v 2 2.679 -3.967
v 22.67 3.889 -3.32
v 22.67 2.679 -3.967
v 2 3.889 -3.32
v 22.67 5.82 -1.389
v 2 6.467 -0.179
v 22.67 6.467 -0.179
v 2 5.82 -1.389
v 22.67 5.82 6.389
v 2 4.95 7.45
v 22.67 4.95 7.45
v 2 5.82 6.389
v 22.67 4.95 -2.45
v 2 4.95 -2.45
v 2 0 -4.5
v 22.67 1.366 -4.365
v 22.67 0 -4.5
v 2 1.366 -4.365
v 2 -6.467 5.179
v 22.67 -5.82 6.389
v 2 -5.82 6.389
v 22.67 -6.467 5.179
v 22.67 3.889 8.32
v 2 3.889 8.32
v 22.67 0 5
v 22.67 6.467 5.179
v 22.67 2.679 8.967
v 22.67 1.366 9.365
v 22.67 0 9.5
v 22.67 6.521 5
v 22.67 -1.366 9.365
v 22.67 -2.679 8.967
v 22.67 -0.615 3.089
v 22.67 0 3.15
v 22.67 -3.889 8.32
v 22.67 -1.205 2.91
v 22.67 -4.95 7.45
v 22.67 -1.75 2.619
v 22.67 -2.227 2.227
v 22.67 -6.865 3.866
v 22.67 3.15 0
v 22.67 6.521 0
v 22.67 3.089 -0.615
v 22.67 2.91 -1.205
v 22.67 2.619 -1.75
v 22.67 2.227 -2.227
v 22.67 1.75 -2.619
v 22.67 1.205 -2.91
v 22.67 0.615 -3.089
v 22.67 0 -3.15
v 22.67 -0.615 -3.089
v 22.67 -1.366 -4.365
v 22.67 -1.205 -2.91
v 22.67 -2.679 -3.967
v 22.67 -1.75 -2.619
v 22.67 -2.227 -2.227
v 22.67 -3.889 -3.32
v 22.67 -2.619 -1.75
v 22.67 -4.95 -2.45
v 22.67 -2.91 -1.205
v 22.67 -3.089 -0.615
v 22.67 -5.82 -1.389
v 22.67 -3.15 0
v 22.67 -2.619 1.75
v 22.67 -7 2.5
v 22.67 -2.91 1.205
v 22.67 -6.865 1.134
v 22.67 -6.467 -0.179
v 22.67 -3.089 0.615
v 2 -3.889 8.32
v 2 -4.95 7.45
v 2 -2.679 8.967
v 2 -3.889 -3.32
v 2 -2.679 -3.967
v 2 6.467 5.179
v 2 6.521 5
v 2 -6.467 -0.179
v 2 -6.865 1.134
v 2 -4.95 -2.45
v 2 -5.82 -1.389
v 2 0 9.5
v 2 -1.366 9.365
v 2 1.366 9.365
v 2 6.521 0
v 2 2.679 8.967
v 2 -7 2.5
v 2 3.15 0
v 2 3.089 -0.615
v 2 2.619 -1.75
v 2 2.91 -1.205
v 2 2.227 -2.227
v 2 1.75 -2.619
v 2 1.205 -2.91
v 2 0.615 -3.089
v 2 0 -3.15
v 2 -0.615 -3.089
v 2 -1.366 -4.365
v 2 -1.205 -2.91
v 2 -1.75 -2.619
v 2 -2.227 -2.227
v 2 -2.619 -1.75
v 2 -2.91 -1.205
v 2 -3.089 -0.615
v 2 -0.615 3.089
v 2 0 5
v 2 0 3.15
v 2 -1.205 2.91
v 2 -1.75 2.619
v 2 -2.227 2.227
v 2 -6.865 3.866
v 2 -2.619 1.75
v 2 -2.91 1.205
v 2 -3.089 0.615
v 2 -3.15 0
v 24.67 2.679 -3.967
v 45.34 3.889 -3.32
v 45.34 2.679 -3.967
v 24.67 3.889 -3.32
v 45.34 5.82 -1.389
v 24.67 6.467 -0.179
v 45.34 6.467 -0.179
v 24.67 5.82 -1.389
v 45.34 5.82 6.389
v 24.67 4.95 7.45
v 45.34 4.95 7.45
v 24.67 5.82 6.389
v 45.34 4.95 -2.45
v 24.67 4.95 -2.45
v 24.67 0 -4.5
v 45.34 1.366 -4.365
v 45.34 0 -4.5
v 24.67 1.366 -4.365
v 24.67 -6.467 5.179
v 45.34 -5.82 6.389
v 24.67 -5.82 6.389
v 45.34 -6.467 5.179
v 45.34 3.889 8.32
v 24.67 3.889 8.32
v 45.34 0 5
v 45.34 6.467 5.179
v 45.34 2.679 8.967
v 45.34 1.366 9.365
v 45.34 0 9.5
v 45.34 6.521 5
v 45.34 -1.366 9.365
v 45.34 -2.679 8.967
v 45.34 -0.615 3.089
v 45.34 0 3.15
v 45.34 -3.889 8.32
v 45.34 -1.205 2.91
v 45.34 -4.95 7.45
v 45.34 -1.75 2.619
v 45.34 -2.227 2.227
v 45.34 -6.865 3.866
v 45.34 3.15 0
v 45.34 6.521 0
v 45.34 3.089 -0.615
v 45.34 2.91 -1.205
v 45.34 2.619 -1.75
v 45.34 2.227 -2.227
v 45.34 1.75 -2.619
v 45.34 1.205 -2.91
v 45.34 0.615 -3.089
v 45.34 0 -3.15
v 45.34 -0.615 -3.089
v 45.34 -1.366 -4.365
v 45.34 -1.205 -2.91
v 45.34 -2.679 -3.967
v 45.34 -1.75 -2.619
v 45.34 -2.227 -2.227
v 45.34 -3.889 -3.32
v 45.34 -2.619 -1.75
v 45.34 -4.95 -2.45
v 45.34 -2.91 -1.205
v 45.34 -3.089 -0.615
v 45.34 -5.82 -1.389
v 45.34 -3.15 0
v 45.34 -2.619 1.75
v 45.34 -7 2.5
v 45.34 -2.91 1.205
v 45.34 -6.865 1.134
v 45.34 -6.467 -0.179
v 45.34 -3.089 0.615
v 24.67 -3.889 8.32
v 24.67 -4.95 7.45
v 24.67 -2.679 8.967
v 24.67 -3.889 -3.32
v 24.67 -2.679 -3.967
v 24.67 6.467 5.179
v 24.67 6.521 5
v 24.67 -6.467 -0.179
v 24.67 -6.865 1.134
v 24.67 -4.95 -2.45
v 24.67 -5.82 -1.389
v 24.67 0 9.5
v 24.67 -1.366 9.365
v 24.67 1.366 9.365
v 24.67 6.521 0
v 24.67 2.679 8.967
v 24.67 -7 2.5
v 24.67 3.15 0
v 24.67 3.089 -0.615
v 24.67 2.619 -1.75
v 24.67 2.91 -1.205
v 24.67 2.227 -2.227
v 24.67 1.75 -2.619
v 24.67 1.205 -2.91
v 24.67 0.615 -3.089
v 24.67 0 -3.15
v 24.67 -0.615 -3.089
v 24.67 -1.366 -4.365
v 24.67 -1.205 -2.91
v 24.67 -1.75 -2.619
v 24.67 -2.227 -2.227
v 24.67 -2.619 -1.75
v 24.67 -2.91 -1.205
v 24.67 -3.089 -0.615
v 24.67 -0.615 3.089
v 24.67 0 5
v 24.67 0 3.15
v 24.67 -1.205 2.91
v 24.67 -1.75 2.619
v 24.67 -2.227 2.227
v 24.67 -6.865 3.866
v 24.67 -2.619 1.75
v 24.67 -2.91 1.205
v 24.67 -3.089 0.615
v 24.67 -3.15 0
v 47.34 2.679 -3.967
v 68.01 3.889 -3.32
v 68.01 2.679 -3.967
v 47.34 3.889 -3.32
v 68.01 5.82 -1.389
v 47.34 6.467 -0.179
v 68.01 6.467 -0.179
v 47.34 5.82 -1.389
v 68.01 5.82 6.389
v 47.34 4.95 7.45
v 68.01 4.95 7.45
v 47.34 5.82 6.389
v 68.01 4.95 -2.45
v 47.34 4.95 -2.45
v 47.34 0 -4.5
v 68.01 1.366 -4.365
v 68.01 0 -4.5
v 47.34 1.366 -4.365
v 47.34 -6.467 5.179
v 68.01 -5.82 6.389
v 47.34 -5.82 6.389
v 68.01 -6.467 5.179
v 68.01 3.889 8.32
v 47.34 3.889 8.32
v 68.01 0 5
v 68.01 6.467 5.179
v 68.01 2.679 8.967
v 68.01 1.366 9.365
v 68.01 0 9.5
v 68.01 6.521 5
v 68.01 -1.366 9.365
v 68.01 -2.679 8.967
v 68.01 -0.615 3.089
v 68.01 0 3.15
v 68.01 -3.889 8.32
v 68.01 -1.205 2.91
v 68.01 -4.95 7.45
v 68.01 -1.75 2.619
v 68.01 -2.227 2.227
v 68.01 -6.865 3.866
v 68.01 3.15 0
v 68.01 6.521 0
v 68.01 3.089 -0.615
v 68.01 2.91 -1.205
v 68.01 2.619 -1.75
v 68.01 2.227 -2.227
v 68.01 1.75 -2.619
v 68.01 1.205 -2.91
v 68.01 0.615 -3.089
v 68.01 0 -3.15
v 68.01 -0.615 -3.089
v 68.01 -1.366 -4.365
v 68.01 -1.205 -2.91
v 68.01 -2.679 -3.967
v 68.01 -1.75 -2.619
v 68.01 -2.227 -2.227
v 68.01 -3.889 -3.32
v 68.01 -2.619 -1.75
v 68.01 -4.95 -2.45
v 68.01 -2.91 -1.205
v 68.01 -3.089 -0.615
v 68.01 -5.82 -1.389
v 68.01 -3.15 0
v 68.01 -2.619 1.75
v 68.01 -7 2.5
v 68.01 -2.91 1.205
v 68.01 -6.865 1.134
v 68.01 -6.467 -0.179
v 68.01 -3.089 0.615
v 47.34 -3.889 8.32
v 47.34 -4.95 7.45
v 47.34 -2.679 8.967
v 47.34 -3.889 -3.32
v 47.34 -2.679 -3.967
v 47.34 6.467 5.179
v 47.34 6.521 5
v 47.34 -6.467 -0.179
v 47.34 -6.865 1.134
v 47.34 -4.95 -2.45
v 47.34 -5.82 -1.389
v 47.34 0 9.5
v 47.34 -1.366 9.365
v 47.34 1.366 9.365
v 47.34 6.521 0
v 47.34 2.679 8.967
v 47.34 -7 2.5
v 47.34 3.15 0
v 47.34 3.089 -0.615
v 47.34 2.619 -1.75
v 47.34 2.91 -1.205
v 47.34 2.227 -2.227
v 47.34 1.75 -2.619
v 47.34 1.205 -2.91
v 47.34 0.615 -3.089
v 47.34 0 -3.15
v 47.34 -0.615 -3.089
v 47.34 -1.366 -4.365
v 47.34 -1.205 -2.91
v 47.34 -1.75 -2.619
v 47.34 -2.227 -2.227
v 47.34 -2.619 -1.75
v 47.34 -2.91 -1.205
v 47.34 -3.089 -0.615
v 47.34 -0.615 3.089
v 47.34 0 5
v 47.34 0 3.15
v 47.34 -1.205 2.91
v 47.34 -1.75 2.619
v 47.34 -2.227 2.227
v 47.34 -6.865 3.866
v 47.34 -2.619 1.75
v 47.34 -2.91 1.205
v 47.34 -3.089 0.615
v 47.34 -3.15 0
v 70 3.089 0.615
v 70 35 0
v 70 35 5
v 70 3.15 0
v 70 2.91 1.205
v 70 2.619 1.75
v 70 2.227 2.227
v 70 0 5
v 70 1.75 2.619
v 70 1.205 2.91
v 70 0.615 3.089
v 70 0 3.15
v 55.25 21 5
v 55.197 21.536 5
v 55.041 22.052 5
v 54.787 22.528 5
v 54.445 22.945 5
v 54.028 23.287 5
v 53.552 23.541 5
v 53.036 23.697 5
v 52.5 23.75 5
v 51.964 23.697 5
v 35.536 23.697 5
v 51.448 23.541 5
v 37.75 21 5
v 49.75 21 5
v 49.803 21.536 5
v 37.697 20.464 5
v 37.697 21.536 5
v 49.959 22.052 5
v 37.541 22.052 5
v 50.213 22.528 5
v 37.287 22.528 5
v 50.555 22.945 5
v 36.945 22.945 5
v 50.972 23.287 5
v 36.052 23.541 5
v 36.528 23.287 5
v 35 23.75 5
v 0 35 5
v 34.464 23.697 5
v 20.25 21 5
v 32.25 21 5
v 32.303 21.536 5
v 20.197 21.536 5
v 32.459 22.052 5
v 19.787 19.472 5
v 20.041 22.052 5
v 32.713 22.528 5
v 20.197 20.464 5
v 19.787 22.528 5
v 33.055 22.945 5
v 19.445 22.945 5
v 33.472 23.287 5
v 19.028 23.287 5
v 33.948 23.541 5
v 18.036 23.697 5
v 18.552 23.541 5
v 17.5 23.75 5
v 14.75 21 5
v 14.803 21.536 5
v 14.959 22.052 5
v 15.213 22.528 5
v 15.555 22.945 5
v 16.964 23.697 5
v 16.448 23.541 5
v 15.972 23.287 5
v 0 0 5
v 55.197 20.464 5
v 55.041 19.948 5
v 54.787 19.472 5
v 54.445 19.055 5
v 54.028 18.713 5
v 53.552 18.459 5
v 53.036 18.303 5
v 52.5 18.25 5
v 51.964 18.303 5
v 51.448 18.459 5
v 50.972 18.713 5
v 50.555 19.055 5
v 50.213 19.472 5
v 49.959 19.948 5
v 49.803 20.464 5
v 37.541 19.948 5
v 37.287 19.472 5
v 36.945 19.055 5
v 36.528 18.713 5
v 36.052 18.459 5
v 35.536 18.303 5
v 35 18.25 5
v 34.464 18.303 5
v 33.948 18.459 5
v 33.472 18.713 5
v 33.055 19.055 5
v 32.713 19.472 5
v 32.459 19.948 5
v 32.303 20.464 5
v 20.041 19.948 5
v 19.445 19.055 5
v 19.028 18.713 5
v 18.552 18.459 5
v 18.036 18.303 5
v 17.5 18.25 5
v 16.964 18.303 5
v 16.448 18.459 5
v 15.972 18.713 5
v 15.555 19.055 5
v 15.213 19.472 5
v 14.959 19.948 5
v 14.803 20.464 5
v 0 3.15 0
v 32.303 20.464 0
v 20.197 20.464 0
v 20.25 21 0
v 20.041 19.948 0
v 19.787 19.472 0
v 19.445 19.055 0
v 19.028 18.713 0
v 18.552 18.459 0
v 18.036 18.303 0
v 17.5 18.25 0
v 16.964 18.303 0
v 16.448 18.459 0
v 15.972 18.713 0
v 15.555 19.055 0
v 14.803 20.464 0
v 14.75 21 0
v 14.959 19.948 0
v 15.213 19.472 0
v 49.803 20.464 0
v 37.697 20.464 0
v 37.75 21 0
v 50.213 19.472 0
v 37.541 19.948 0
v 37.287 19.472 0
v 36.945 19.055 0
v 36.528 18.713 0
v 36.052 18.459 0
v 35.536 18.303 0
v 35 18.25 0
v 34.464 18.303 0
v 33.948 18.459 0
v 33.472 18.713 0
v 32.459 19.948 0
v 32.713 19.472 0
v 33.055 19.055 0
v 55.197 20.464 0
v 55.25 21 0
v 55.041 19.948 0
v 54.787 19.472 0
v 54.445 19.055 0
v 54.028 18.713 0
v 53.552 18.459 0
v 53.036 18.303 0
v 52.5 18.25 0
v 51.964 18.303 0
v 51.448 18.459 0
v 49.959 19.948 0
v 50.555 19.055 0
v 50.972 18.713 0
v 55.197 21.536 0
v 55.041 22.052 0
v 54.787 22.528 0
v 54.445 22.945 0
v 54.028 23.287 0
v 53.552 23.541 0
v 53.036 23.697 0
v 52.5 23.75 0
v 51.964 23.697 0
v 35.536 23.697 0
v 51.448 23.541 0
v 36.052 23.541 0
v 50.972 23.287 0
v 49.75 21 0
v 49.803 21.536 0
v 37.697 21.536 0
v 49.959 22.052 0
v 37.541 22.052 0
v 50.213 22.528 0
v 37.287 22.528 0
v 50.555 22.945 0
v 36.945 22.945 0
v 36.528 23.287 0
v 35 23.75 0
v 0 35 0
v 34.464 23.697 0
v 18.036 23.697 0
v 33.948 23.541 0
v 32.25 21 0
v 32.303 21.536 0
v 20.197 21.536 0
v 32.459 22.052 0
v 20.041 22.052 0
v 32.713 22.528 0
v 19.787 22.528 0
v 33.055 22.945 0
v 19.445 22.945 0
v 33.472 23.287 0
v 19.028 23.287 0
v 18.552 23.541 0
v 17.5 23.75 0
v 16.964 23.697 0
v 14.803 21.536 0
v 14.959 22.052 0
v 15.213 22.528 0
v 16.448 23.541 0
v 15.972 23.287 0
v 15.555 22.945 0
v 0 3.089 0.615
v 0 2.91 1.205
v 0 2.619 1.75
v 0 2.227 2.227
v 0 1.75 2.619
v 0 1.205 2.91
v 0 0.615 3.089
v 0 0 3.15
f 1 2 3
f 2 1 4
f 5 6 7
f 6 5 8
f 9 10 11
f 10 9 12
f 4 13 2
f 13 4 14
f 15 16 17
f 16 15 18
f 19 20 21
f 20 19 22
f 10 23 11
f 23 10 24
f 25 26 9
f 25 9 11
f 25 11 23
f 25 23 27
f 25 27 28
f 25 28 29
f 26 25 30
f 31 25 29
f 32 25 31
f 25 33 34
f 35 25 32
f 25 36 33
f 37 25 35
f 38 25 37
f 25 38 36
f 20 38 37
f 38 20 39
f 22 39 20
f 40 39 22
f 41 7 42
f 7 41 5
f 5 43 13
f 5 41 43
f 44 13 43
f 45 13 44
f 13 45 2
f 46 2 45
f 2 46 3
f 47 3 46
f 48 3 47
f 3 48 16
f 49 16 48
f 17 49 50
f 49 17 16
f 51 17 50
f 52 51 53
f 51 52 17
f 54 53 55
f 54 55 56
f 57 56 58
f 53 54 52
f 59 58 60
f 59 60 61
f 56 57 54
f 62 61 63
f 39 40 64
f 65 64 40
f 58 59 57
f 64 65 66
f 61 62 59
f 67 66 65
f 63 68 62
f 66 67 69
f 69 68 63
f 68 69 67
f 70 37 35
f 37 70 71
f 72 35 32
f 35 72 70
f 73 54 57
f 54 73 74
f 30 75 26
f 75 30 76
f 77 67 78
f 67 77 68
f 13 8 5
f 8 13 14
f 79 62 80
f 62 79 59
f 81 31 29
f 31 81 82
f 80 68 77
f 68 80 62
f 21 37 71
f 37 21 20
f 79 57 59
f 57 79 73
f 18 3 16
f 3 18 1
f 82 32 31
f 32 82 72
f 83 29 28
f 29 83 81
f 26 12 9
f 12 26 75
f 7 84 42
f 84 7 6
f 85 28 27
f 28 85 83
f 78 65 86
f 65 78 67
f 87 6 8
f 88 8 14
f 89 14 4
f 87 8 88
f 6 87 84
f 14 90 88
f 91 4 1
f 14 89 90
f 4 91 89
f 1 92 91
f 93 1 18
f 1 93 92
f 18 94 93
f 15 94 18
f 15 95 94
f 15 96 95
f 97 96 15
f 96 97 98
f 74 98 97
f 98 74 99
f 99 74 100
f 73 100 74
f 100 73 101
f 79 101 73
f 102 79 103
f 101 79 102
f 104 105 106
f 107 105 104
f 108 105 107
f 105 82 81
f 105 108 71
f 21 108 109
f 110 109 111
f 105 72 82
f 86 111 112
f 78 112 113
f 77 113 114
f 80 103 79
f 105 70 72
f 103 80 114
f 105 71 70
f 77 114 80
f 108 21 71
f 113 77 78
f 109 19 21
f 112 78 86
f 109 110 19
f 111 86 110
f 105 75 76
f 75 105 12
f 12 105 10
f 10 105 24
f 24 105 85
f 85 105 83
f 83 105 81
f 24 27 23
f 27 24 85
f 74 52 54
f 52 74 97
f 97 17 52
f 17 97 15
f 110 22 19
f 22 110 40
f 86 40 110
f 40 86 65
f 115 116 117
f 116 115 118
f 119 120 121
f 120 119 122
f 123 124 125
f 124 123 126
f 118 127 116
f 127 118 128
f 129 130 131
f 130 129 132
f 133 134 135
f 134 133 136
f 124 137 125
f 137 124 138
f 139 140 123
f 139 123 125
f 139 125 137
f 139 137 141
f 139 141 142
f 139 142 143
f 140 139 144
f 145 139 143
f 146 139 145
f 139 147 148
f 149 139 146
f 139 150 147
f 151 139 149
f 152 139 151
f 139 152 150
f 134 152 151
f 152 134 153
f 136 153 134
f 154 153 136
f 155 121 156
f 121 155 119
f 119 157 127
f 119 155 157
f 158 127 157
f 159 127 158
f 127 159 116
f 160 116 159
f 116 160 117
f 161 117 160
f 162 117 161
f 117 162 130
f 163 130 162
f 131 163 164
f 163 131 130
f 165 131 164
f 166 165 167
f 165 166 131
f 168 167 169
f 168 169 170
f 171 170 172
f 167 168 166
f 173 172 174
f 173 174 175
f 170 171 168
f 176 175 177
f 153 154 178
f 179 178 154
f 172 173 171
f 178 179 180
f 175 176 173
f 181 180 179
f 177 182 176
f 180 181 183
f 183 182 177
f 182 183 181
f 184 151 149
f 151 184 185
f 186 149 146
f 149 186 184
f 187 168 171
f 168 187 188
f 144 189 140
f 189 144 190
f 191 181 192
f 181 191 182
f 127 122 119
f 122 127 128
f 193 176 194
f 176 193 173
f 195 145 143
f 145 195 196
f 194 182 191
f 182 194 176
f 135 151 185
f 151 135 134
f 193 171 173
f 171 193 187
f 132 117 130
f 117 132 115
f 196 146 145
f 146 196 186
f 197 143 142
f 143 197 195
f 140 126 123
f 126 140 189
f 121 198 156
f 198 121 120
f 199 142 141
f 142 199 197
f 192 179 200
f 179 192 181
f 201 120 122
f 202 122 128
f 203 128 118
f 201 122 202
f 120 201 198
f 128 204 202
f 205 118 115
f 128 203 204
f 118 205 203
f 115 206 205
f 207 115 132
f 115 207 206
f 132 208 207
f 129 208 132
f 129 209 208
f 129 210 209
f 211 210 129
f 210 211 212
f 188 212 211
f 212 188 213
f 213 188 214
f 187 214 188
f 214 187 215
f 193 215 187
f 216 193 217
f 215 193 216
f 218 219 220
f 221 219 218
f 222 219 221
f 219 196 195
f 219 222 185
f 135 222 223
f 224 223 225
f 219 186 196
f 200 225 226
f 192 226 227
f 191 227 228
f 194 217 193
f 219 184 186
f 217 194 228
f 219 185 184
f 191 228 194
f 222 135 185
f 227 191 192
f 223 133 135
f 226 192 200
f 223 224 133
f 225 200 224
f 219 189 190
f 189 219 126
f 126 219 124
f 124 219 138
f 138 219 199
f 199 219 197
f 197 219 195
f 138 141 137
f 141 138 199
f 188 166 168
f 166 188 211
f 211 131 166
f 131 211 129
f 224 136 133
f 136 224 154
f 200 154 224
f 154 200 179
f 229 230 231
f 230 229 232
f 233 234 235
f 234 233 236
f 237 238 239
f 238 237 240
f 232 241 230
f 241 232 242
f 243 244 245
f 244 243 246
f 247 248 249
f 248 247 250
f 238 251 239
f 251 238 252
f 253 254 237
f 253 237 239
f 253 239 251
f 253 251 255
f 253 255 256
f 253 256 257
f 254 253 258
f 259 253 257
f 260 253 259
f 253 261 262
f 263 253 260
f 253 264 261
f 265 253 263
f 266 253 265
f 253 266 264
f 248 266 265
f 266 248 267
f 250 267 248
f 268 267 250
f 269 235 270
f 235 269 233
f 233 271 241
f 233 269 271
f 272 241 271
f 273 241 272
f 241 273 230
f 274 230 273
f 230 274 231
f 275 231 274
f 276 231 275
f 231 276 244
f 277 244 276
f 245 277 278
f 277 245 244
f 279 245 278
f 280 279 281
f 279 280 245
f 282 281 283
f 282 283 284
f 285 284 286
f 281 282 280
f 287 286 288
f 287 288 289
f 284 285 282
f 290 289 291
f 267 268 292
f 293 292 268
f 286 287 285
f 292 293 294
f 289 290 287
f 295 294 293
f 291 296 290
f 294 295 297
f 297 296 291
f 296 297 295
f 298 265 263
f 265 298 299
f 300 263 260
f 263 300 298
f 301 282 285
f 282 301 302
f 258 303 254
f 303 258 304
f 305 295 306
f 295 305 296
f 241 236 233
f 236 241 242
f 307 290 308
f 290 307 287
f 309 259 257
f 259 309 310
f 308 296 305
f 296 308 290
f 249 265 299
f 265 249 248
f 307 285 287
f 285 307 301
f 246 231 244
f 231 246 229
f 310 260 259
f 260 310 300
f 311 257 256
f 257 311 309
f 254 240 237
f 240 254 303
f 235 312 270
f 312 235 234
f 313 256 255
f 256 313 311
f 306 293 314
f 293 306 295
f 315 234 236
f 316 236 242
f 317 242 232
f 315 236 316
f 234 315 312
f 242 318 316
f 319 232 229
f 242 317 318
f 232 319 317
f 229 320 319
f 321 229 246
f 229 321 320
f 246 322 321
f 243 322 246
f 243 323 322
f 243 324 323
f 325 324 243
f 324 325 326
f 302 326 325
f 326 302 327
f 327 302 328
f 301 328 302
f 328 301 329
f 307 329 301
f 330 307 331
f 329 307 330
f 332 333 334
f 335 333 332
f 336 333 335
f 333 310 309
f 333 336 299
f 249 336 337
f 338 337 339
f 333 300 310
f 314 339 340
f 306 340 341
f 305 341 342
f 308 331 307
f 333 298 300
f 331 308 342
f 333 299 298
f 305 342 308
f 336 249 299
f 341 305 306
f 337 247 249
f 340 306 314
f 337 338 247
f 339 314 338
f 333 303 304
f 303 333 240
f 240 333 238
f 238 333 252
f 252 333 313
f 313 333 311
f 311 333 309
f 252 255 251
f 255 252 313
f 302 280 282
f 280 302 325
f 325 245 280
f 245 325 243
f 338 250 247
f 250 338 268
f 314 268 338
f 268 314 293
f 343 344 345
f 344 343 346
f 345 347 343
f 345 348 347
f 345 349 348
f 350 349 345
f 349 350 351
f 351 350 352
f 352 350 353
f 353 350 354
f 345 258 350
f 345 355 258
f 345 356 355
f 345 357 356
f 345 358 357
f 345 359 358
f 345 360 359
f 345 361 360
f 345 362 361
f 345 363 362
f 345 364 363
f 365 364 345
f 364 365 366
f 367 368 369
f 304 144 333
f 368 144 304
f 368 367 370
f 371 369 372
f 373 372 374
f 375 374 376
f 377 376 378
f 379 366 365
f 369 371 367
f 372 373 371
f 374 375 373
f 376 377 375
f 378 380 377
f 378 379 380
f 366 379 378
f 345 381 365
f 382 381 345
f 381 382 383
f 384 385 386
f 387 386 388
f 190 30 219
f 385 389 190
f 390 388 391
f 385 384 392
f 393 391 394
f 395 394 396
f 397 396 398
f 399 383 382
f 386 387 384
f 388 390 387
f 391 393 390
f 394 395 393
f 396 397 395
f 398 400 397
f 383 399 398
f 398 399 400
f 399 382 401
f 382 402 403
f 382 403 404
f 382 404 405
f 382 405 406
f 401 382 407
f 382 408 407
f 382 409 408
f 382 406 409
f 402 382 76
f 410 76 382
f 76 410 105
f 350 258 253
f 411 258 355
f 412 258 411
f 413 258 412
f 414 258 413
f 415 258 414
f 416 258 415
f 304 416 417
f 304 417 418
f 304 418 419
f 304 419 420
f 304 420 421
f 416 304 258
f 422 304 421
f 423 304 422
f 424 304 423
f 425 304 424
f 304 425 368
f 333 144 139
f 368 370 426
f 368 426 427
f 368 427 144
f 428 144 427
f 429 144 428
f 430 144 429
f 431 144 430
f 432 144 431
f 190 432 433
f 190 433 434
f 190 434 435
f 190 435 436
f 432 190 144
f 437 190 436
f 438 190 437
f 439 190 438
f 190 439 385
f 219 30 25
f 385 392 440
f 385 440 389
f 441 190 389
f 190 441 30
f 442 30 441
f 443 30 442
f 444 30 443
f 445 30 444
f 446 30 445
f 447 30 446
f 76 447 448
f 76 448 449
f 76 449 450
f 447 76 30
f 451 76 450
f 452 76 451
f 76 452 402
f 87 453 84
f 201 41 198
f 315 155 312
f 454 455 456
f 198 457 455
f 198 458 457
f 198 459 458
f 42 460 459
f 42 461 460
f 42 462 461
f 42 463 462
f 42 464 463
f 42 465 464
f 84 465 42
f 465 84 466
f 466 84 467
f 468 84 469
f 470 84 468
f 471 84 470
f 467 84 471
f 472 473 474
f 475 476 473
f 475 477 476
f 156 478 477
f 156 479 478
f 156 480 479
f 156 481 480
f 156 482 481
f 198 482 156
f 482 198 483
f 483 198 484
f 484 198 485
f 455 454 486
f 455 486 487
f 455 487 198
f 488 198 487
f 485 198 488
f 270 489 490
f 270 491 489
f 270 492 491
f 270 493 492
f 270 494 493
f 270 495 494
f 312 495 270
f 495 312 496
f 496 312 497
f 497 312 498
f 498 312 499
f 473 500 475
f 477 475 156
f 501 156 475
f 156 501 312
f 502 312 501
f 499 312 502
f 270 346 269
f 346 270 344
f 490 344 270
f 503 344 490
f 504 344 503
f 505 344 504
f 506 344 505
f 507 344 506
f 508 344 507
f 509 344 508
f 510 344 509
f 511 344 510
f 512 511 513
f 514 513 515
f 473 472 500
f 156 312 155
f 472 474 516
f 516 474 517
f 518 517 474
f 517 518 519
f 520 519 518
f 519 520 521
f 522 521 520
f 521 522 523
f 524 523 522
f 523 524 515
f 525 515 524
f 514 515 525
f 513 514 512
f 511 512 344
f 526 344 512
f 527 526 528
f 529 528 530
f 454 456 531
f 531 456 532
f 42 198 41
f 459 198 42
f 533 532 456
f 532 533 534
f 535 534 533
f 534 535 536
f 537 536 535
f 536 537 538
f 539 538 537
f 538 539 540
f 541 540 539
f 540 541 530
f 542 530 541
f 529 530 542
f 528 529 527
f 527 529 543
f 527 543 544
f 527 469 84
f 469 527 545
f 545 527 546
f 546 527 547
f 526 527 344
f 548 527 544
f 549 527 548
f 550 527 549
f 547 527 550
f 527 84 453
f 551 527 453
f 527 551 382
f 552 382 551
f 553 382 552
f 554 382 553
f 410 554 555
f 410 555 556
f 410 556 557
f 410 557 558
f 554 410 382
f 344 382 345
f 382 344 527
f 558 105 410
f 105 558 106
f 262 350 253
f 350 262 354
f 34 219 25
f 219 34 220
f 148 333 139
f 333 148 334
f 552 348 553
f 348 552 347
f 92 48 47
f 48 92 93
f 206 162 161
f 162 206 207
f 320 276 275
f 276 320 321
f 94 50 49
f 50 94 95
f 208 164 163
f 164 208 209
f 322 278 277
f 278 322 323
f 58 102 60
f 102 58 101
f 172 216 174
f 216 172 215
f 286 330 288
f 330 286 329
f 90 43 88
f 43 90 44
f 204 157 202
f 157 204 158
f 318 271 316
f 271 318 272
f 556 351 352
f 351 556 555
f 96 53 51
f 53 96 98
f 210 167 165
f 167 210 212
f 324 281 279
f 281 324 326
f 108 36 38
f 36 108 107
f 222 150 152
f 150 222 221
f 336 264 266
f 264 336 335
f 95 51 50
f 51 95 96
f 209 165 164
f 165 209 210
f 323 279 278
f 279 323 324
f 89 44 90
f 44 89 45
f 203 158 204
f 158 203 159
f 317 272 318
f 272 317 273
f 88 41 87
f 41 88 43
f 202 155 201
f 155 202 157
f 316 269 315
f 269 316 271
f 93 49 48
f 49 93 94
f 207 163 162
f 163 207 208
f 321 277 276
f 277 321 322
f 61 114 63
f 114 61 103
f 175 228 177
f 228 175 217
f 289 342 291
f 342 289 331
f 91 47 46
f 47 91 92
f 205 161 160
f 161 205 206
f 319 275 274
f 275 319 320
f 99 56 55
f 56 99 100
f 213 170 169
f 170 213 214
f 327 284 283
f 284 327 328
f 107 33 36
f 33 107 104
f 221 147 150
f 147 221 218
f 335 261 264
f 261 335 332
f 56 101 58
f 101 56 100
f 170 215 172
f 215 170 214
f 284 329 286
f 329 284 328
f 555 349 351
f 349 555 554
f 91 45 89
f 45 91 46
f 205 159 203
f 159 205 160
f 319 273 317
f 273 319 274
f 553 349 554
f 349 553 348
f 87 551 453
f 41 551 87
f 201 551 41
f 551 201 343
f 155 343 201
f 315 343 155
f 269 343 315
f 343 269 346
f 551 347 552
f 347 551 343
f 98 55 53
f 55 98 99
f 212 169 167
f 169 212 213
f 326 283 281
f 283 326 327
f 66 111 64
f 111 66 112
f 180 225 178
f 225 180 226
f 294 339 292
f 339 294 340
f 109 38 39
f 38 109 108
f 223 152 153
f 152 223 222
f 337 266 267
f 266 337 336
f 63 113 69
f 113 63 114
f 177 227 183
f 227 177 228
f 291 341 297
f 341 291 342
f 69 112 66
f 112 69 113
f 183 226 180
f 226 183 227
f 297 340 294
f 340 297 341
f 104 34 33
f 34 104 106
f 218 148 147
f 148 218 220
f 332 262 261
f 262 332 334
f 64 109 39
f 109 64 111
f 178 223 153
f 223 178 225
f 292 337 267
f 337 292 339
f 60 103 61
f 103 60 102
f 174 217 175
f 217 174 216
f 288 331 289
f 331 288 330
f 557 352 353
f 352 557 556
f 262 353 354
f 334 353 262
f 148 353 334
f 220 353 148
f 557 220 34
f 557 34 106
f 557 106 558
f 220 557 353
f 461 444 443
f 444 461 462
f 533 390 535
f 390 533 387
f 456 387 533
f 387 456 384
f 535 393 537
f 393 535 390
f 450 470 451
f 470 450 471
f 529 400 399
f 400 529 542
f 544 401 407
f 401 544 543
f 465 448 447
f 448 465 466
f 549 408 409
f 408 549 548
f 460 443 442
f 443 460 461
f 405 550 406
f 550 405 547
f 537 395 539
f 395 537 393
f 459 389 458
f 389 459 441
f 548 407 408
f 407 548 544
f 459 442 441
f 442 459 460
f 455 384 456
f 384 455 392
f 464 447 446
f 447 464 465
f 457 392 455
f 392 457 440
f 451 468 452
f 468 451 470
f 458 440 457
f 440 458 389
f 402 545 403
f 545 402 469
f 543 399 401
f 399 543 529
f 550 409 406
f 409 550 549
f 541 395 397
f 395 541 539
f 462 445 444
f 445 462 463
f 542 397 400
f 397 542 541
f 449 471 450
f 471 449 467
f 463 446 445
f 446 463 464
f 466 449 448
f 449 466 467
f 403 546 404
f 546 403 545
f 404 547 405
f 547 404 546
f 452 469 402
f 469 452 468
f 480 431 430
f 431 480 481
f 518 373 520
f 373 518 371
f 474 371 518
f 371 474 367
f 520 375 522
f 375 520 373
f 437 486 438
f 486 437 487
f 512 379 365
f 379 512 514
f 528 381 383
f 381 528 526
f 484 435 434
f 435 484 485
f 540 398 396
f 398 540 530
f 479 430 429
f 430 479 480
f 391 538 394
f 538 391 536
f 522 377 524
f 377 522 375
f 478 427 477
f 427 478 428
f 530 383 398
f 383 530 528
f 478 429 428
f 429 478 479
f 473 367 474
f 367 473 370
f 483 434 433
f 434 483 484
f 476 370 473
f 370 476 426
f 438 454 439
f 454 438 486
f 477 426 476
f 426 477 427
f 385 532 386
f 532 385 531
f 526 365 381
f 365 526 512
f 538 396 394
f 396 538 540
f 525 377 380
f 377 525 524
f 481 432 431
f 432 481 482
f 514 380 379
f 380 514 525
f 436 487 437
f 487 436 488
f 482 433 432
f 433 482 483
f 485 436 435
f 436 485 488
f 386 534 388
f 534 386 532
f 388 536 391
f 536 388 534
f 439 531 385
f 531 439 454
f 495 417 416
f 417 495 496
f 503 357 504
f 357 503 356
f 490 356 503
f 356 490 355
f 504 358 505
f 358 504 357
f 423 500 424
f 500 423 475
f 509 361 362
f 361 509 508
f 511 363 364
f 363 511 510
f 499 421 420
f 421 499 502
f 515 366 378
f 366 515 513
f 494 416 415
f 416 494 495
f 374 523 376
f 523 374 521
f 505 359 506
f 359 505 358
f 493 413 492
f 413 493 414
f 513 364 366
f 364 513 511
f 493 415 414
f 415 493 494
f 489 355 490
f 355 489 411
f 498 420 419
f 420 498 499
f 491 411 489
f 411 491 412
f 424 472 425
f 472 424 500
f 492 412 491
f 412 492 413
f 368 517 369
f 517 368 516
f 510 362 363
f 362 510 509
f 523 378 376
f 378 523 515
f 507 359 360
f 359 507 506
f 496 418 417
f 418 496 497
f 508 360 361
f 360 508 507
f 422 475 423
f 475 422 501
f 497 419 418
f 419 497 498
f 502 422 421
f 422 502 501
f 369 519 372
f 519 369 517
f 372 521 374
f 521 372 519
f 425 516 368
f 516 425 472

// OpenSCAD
$fn = 32;

// ----------------------------------------------------------------------
// Hinge leaf: 70 x 42 x 14 mm
// ----------------------------------------------------------------------

// --- parameters (mm) ---
plate_len = 70;           // leaf length, X
plate_w = 35;             // leaf width, Y
plate_t = 5;              // leaf thickness
barrel_d = 14;            // knuckle diameter
barrel_w = 20.67;         // knuckle width
knuckle_n = 3;            // number of knuckles
pin_d = 6.3;              // pin bore
gap = 2;                  // gap between the knuckles
screw_d = 5.5;            // screw clearance

module leaf() {
  cube([plate_len, plate_w, plate_t]);
}

module knuckles() {
  /* barrels sit on the leaf edge, the pin axis at half the leaf thickness */
  for (i = [0 : knuckle_n - 1])
    translate([gap + i * (barrel_w + gap), 0, plate_t * 0.5])
      rotate([0, 90, 0]) cylinder(h = barrel_w, d = barrel_d);
}

difference() {
  union() {
    leaf();
    knuckles();
  }
  rotate([0, 90, 0]) translate([0, 0, -1])
    cylinder(h = plate_len + 2, d = pin_d);
  translate([17.5, plate_w * 0.6, -1]) cylinder(h = plate_t + 2, d = screw_d);
  translate([35, plate_w * 0.6, -1]) cylinder(h = plate_t + 2, d = screw_d);
  translate([52.5, plate_w * 0.6, -1]) cylinder(h = plate_t + 2, d = screw_d);
}
